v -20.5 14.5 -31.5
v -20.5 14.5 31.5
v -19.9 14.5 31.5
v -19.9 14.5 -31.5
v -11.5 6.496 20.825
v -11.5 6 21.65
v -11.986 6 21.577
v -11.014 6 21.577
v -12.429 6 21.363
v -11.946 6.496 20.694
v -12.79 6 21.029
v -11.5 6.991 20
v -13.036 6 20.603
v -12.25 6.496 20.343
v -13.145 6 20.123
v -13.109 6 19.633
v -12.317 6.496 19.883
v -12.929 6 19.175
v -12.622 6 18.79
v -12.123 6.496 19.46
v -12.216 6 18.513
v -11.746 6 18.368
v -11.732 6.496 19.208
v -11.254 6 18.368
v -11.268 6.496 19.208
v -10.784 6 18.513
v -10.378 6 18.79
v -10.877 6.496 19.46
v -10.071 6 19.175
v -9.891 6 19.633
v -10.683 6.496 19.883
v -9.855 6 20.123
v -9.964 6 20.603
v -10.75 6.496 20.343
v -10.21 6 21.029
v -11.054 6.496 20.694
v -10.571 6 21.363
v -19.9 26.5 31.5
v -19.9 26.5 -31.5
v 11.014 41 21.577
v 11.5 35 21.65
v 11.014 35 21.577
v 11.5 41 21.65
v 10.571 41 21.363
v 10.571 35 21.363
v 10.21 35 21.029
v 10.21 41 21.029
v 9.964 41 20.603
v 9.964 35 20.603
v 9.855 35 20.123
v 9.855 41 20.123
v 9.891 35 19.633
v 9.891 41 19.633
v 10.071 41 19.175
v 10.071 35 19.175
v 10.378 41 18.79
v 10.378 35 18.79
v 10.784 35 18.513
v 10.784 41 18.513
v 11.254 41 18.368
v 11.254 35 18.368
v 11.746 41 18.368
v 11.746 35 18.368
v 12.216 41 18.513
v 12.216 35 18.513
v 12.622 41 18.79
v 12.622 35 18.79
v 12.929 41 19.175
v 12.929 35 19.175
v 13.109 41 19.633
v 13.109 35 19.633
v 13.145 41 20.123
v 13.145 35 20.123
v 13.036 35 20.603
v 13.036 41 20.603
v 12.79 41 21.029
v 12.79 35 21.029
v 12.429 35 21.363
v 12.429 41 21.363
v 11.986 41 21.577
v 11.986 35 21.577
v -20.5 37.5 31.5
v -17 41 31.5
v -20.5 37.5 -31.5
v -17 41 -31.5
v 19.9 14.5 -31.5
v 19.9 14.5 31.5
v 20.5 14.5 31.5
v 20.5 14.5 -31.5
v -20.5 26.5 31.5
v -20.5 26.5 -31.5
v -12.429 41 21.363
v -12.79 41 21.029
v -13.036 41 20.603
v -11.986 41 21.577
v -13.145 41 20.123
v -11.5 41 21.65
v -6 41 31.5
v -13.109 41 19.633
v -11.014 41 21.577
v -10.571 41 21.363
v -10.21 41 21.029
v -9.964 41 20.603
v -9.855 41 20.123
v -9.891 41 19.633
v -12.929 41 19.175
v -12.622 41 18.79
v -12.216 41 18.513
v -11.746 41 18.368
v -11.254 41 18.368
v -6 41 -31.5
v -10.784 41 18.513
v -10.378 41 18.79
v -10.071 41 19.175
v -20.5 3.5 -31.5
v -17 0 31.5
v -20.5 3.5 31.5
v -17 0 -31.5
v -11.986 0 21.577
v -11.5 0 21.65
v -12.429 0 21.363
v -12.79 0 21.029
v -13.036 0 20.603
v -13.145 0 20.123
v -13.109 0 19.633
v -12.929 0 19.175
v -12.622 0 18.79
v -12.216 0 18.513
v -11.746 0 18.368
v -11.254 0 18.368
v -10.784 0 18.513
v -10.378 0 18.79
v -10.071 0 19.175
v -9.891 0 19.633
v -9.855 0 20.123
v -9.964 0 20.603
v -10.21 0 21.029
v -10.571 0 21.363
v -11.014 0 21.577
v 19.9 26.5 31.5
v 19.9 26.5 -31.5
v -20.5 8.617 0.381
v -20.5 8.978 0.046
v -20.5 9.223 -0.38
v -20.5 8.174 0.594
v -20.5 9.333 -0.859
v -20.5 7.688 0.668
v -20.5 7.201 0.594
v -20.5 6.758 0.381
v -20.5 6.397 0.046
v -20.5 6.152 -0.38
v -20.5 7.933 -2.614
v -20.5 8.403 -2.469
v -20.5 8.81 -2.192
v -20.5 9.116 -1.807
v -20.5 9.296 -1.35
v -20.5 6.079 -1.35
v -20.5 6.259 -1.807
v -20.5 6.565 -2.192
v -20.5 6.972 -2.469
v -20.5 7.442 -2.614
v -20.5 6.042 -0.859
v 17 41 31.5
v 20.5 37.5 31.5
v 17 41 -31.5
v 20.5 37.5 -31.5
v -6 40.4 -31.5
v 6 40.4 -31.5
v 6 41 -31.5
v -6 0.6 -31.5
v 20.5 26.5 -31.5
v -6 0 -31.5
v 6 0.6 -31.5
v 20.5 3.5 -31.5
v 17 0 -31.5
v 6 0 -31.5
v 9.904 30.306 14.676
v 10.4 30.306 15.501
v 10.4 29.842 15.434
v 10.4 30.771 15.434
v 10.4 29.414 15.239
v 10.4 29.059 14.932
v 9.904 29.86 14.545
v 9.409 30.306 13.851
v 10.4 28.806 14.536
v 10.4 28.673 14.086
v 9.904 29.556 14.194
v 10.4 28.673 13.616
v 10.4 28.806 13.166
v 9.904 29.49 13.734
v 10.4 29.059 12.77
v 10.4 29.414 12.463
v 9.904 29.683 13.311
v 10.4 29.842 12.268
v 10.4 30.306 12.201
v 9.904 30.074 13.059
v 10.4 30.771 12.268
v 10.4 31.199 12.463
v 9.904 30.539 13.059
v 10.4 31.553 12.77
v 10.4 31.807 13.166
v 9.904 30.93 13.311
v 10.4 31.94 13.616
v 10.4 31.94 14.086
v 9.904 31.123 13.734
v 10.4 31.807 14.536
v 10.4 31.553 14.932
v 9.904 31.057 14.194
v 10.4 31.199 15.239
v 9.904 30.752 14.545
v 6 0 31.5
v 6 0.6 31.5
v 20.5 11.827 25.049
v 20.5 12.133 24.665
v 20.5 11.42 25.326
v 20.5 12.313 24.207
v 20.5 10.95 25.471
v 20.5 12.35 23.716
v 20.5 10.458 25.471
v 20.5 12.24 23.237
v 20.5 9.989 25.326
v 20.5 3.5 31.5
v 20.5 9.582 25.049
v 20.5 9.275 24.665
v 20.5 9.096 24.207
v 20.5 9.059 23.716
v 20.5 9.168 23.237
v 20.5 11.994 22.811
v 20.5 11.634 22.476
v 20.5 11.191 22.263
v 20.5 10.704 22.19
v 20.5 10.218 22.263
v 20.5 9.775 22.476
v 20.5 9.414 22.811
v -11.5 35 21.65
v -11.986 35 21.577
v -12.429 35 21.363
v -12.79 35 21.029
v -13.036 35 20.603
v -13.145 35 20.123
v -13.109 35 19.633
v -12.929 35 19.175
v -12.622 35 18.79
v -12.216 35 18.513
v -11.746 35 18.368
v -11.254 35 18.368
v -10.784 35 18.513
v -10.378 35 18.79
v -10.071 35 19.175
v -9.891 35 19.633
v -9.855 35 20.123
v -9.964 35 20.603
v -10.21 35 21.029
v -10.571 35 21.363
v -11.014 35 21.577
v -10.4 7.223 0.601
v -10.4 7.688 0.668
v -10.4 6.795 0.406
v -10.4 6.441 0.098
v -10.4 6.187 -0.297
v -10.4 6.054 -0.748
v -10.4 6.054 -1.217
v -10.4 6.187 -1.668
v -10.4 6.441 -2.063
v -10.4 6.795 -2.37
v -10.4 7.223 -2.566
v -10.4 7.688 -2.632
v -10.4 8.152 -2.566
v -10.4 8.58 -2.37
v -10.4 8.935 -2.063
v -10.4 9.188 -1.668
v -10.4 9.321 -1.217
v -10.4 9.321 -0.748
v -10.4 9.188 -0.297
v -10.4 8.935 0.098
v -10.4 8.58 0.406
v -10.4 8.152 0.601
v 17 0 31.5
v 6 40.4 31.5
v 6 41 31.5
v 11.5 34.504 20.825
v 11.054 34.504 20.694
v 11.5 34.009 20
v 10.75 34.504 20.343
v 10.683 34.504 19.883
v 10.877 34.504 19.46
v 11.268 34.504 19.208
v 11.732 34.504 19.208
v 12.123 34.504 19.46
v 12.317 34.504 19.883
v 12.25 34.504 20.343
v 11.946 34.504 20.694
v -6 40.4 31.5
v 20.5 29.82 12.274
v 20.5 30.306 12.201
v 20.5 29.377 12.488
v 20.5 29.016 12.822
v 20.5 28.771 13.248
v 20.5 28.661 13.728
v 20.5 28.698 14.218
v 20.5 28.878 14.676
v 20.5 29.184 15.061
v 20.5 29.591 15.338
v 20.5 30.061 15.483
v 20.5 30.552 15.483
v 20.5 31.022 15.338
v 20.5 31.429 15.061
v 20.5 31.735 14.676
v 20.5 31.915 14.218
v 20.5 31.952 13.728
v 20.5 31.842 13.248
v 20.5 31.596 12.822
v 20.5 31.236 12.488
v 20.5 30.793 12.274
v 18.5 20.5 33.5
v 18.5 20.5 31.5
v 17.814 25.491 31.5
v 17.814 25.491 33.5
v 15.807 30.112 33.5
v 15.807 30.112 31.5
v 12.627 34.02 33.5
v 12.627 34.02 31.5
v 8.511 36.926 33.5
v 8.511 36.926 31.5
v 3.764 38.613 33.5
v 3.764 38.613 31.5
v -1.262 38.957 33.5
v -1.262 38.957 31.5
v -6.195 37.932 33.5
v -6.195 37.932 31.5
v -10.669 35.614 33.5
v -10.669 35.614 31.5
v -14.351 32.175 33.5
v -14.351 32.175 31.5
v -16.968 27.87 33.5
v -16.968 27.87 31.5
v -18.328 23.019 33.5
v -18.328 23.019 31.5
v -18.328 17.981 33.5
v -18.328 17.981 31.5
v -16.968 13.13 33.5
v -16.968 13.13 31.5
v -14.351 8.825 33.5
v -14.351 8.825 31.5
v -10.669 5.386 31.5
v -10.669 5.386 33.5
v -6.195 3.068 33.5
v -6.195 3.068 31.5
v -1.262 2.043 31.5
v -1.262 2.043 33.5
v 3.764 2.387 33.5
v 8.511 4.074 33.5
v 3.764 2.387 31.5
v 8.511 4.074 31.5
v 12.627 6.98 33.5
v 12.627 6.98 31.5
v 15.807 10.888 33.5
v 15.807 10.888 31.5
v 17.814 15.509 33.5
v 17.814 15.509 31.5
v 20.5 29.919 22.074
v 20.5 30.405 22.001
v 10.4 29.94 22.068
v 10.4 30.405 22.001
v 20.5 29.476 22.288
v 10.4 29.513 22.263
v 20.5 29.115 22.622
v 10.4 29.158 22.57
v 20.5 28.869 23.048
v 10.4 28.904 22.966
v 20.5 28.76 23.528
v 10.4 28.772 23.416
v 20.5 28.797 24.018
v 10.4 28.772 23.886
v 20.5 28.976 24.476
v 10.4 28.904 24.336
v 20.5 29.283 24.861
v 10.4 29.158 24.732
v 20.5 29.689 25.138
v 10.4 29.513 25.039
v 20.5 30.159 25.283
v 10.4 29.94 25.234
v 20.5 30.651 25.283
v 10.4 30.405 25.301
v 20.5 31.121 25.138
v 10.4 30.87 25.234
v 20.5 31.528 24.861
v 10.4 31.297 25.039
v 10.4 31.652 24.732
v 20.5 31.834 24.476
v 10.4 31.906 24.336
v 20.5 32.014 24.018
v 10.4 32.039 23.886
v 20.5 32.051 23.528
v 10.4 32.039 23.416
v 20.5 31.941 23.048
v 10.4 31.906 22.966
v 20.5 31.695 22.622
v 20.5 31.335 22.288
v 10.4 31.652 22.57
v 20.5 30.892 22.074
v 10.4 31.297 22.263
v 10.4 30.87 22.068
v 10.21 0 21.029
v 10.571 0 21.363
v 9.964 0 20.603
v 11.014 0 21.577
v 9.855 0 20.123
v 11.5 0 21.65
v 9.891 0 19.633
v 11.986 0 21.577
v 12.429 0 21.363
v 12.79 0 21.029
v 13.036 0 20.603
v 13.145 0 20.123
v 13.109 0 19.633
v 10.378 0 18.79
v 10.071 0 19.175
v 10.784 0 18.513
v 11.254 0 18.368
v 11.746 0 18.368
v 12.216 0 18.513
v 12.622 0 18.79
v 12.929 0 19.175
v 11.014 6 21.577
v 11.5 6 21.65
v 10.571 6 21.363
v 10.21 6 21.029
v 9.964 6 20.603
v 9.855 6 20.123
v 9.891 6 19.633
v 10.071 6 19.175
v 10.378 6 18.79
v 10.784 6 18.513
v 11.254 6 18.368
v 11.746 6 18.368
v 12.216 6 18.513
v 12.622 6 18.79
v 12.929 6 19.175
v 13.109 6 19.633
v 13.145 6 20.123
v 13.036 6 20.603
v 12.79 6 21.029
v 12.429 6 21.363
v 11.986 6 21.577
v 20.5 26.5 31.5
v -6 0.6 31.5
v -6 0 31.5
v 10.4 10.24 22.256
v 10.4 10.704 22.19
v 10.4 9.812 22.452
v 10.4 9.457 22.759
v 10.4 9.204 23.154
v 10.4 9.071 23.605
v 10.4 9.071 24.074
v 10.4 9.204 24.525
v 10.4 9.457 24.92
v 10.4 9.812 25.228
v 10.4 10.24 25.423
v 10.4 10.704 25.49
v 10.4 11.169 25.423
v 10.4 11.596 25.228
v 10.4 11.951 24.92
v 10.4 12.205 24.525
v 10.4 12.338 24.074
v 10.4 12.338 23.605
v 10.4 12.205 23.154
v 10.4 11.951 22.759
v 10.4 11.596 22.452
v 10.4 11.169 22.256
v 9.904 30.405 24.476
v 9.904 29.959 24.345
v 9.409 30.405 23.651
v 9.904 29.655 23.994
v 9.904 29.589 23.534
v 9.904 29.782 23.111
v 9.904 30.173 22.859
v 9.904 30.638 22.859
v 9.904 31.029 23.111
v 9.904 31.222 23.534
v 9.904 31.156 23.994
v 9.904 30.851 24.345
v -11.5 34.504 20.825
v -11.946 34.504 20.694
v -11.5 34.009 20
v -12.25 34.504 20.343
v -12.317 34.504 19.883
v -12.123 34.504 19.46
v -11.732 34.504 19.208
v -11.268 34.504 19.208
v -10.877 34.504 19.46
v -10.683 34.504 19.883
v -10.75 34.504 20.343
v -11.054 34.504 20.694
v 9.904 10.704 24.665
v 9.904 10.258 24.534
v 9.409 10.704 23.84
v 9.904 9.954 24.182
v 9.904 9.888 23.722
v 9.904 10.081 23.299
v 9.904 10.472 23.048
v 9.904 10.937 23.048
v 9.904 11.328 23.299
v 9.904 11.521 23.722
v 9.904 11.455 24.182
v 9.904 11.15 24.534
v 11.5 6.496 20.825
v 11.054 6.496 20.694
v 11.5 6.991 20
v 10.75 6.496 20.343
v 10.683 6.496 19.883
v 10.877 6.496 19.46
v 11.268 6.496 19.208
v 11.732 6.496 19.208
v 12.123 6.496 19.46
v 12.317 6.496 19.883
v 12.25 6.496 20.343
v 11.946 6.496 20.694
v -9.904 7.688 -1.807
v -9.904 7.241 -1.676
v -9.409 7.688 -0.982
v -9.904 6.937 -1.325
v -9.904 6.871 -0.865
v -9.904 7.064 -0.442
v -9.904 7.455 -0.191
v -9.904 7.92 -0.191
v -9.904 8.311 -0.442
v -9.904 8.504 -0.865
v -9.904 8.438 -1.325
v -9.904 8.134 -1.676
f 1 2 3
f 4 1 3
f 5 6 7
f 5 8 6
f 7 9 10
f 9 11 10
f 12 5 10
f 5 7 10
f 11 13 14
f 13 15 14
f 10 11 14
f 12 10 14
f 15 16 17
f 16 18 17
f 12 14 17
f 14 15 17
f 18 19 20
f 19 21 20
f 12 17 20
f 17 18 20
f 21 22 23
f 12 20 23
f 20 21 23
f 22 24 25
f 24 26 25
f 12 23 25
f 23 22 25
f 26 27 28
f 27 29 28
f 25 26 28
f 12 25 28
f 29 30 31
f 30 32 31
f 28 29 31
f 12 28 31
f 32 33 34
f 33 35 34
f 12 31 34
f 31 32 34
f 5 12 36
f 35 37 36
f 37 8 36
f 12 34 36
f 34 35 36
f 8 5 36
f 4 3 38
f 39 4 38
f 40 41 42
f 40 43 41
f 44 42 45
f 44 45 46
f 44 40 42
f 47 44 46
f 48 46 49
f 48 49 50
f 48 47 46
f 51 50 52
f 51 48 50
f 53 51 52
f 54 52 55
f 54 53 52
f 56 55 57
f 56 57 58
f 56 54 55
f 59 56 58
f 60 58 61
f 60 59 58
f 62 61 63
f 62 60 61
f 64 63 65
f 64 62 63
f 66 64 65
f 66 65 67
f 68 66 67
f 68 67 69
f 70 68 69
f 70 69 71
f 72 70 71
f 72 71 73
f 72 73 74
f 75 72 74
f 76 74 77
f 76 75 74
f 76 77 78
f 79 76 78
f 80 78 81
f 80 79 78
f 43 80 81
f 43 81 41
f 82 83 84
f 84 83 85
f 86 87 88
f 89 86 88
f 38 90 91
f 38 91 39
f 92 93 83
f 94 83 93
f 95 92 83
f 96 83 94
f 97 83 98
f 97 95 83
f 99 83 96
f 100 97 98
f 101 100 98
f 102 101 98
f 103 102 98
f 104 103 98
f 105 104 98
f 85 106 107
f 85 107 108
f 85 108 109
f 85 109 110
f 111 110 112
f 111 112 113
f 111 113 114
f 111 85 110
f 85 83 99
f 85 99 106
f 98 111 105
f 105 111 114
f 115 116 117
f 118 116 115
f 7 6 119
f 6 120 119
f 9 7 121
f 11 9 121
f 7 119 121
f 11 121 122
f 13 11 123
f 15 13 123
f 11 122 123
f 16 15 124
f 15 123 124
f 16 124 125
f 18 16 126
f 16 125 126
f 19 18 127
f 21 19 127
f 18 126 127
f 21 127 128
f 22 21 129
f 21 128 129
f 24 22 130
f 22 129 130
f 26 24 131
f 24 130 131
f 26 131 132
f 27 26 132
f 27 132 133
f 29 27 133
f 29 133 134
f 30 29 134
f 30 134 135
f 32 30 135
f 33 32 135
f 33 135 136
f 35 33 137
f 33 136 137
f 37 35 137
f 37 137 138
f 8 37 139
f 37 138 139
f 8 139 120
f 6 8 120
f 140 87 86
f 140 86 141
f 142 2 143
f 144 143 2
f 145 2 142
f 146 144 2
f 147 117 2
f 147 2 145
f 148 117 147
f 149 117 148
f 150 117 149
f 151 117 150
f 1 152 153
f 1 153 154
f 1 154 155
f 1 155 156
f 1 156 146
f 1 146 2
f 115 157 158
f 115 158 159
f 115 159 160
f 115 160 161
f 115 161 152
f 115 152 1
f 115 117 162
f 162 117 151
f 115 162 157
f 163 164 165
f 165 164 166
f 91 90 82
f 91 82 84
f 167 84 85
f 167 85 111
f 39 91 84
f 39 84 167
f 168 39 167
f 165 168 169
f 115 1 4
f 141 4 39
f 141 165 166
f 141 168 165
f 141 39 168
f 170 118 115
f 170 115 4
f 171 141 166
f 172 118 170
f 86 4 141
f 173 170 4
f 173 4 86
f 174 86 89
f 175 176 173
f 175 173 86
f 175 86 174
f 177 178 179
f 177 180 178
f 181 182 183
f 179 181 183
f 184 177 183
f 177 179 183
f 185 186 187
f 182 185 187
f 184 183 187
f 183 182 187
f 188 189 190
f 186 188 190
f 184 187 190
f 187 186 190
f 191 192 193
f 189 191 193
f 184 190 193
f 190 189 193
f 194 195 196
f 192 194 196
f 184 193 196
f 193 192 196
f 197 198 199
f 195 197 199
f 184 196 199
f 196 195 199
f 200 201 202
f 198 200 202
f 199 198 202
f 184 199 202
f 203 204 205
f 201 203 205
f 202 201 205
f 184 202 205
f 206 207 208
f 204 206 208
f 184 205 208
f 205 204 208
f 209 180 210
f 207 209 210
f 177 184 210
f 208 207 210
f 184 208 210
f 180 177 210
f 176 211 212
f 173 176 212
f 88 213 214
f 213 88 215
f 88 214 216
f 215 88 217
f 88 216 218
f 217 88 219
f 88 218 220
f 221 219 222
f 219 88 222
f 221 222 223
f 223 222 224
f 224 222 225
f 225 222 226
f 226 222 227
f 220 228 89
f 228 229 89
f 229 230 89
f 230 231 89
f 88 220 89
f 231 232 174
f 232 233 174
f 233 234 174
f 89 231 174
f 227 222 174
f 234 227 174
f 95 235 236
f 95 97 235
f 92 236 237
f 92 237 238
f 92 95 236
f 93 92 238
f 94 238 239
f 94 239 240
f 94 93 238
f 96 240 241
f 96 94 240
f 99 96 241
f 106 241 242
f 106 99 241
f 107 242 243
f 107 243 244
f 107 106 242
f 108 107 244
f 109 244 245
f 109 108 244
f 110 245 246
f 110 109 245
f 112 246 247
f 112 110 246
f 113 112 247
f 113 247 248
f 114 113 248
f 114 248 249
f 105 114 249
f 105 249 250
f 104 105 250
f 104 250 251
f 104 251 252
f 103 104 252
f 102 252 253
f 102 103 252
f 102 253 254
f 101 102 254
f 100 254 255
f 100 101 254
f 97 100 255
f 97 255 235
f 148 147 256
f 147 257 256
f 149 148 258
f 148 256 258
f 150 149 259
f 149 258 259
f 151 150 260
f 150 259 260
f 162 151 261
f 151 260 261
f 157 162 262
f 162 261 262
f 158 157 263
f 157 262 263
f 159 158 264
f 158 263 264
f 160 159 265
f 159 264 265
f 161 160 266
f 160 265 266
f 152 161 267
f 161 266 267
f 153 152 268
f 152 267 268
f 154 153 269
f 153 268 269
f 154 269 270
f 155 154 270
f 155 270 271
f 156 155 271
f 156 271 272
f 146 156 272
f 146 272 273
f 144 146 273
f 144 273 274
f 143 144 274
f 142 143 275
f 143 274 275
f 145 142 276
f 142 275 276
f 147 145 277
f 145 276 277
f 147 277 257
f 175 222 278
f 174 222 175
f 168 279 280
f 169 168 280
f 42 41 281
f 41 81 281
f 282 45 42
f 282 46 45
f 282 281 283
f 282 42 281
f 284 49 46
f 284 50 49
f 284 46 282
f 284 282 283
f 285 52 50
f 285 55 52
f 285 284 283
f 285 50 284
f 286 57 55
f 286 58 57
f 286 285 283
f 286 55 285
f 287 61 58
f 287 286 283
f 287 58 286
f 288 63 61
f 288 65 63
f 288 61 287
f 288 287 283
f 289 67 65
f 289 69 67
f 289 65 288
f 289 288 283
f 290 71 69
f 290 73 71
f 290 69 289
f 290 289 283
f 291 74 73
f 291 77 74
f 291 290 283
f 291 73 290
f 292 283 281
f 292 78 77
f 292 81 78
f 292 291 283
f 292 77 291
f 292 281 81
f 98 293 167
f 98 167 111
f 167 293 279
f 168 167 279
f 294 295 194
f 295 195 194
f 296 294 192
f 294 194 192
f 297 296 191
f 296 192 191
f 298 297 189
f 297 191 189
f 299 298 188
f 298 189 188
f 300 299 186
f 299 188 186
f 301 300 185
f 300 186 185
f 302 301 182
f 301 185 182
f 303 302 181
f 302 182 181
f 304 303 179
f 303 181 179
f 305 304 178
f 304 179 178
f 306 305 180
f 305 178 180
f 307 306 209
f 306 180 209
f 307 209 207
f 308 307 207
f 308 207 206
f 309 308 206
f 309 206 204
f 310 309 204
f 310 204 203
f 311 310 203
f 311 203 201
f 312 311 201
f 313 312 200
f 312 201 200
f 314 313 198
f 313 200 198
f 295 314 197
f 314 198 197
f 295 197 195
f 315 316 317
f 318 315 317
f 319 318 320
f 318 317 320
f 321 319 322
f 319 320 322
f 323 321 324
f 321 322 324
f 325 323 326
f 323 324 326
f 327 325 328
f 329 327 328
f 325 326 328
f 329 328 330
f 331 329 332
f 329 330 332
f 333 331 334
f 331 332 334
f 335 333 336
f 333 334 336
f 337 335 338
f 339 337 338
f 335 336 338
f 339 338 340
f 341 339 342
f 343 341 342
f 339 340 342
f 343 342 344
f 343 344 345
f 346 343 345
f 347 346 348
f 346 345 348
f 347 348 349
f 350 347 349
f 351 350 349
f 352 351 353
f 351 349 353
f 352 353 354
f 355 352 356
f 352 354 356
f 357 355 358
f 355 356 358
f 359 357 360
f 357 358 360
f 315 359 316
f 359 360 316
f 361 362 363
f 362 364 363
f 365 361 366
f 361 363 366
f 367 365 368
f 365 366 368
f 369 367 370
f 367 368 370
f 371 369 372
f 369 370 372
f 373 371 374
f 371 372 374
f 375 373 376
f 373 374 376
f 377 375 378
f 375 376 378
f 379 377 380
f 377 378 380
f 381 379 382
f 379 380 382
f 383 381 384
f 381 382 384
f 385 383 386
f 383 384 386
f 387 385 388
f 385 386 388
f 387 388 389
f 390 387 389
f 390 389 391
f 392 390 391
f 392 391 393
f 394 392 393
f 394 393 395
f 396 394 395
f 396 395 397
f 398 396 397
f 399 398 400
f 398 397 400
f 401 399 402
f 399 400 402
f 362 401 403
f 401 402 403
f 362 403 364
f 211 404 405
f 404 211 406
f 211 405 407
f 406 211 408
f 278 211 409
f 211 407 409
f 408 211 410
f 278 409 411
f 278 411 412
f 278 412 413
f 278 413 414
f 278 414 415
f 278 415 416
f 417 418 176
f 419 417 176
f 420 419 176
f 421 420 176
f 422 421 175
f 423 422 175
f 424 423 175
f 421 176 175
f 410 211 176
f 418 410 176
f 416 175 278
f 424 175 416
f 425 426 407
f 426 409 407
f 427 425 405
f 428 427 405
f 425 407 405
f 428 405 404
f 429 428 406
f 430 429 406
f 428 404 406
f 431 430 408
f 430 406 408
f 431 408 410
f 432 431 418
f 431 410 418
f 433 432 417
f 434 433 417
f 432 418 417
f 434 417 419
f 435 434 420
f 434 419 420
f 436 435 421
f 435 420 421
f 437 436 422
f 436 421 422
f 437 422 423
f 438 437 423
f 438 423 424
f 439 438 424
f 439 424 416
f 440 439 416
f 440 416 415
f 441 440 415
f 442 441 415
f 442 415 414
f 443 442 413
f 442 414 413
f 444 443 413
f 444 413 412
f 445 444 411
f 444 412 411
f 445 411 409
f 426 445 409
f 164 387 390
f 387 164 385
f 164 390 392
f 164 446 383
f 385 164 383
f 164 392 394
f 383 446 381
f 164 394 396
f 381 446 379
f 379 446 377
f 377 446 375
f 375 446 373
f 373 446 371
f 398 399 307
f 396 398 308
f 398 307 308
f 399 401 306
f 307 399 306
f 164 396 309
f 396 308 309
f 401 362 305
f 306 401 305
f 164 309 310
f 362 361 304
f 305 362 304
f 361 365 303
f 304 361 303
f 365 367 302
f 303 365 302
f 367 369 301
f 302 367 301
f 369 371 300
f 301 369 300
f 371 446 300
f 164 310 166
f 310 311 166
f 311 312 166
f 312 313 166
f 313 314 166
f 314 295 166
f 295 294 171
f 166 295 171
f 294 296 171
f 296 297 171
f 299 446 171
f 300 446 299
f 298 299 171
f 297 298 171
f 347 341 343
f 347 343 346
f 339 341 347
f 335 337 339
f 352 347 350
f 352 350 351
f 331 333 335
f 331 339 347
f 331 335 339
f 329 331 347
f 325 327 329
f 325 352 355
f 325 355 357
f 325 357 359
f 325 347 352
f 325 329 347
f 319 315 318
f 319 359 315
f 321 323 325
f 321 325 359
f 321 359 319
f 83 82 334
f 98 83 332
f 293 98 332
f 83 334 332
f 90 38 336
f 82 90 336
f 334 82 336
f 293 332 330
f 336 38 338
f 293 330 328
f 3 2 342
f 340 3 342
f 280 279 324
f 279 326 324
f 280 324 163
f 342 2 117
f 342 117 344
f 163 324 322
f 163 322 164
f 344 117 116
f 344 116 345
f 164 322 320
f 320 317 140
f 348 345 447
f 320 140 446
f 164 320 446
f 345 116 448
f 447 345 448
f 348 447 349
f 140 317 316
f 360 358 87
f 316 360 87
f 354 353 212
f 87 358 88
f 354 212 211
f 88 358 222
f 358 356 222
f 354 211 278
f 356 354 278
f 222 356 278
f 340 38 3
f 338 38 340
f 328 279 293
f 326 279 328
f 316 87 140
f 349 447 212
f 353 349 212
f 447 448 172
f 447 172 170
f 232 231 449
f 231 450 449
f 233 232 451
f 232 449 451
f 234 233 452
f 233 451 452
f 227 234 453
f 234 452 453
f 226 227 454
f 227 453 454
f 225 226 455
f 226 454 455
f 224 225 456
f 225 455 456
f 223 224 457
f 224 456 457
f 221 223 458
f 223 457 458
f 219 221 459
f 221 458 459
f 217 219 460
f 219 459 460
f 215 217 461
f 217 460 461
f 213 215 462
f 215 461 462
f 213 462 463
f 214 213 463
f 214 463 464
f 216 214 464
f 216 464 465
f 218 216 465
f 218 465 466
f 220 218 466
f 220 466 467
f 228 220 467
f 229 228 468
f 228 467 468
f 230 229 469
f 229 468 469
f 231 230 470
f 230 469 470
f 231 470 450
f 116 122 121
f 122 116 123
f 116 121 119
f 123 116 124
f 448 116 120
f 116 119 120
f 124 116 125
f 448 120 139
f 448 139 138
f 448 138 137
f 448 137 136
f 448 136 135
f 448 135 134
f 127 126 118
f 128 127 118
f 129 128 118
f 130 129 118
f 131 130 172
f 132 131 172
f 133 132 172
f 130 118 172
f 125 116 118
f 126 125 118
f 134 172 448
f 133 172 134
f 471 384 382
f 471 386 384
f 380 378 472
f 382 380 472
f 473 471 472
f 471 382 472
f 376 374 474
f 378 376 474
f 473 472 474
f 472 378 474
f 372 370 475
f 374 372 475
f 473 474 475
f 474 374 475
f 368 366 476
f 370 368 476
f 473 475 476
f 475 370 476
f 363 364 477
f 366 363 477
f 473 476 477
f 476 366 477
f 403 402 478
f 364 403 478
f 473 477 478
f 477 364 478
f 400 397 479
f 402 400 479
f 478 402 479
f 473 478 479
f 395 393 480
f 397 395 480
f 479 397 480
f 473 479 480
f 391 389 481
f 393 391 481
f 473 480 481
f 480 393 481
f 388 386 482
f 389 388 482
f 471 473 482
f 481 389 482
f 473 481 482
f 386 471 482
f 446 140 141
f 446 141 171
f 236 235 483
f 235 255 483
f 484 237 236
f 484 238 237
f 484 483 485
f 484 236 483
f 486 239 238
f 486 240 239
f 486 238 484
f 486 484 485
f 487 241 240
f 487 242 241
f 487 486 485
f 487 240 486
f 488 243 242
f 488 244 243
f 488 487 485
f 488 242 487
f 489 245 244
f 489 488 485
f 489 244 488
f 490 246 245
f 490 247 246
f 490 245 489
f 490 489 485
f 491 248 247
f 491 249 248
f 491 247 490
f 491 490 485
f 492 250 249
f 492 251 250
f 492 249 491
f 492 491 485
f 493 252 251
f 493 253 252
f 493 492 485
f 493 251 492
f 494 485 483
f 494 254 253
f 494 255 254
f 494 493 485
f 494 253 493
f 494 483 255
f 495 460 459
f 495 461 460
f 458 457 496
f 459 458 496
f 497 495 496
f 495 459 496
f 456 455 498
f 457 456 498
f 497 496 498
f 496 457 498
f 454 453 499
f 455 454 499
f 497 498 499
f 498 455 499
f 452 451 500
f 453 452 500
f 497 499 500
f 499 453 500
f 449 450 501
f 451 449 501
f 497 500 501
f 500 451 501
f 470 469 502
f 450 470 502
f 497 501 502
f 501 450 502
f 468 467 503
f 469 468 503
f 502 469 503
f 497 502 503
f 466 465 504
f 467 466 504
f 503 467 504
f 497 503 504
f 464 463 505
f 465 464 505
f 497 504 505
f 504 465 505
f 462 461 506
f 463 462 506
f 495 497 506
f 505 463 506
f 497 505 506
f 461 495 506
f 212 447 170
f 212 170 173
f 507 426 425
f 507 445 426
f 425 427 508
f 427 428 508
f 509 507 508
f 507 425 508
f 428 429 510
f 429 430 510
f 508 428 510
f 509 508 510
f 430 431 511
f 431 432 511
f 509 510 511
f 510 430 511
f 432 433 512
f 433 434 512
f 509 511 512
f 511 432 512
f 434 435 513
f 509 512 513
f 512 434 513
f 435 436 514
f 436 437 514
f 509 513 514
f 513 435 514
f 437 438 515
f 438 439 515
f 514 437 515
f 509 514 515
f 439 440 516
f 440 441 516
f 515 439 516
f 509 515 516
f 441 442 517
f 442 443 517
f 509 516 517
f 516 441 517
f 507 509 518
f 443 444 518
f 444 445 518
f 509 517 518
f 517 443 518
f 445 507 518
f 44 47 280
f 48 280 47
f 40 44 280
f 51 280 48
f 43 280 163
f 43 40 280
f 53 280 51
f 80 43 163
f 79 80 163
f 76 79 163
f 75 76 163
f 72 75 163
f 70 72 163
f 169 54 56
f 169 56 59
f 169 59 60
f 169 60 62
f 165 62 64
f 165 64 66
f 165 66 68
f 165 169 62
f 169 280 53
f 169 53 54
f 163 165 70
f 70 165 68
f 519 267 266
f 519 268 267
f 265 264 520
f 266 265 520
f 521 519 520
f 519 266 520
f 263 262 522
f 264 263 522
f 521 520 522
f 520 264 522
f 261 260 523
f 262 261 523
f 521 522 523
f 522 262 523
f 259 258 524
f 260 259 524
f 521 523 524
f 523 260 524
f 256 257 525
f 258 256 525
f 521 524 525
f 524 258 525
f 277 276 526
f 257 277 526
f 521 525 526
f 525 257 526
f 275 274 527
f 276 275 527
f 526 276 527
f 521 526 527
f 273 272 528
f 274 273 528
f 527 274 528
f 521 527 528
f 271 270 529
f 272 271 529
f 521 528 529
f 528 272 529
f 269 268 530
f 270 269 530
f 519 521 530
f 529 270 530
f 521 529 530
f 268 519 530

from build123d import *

# Parameters (mm, degrees)
SKETCH_1_W                       = 41
SKETCH_1_H                       = 63
EXTRUDE_1_DEPTH                  = 41
HOLE_WIZARD_M4_1_AT_2_COUNT      = 2
HOLE_WIZARD_M4_1_AT_2_PITCH      = 23
CHAMFER_1_SIZE                   = 3.5
CUT_EXTRUDE_1_REACH              = 79.912
SKETCH_4_W                       = 12
SKETCH_4_H                       = 0.6
SKETCH_4_W_2                     = 0.6
SKETCH_4_H_2                     = 12
SKETCH_5_R                       = 18.5
EXTRUDE_2_DEPTH                  = 2
HOLE_WIZARD_M4_3_D               = 3.3
HOLE_WIZARD_M4_3_DEPTH           = 10.1
HOLE_WIZARD_M4_3_TIP             = 0.991420021
HOLE_WIZARD_M4_3_ON_FACE_2_D     = 3.3
HOLE_WIZARD_M4_3_ON_FACE_2_DEPTH = 10.1
HOLE_WIZARD_M4_3_ON_FACE_2_TIP   = 0.991420021


with BuildPart() as part:
    # 草图1 → 凸台-拉伸1 (new body)
    with BuildSketch(Plane(origin=(0, 0, 0), x_dir=(1, 0, 0), z_dir=(0, 1, 0))):
        Rectangle(SKETCH_1_W, SKETCH_1_H)
    extrude(amount=EXTRUDE_1_DEPTH)

    # 草图3 → M4 螺纹孔1 (revolve, cut)
    with BuildSketch(Plane(origin=(-11.5, 41, 20), x_dir=(0, 0, 1), z_dir=(1, 0, 0))):
        Polygon((0, 0), (0, 6.991420021), (1.65, 6), (1.65, 0), align=None)
    hole_wizard_m4_1 = revolve(axis=Axis((-11.5, 47.35, 20), (0, -1, 0)), mode=Mode.SUBTRACT)

    # M4 螺纹孔1 at 2: M4 螺纹孔1 ×2
    with Locations(*[(i * HOLE_WIZARD_M4_1_AT_2_PITCH, 0, 0) for i in range(1, HOLE_WIZARD_M4_1_AT_2_COUNT)]):
        add(hole_wizard_m4_1, mode=Mode.SUBTRACT)

    # 镜向1: M4 螺纹孔1 across plane
    add(hole_wizard_m4_1.mirror(Plane.ZX.offset(20.5)), mode=Mode.SUBTRACT)

    # 镜向1 copy 1 sketch → 镜向1 copy 1 (revolve, cut)
    with BuildSketch(Plane(origin=(11.5, 0, 20), x_dir=(0, 0, 1), z_dir=(1, 0, 0))):
        Polygon((0, 0), (0, -6.991420021), (1.65, -6), (1.65, 0), align=None)
    revolve(axis=Axis((11.5, -6.35, 20), (0, -1, 0)), mode=Mode.SUBTRACT)

    # 倒角1
    chamfer_1_edges = [part.edges().sort_by_distance(p)[0] for p in [
        (-20.5, 41, 0),
        (20.5, 41, 0),
        (-20.5, 0, 0),
        (20.5, 0, 0),
    ]]
    chamfer(chamfer_1_edges, length=CHAMFER_1_SIZE)

    # 草图4 → 切除-拉伸1 (cut, up to next)
    with BuildSketch(Plane.XY.offset(31.5), mode=Mode.PRIVATE) as cut_extrude_1_sk1:
        with Locations((0, 40.7)):
            Rectangle(SKETCH_4_W, SKETCH_4_H)
    cut_extrude_1_tool1 = extrude(cut_extrude_1_sk1.sketch, amount=-CUT_EXTRUDE_1_REACH, mode=Mode.PRIVATE) & part.part
    # 草图4 → 切除-拉伸1 (cut, up to next)
    with BuildSketch(Plane.XY.offset(31.5), mode=Mode.PRIVATE) as cut_extrude_1_sk2:
        with Locations((20.2, 20.5)):
            Rectangle(SKETCH_4_W_2, SKETCH_4_H_2)
    cut_extrude_1_tool2 = extrude(cut_extrude_1_sk2.sketch, amount=-CUT_EXTRUDE_1_REACH, mode=Mode.PRIVATE) & part.part
    # 草图4 → 切除-拉伸1 (cut, up to next)
    with BuildSketch(Plane.XY.offset(31.5), mode=Mode.PRIVATE) as cut_extrude_1_sk3:
        with Locations((0, 0.3)):
            Rectangle(SKETCH_4_W, SKETCH_4_H)
    cut_extrude_1_tool3 = extrude(cut_extrude_1_sk3.sketch, amount=-CUT_EXTRUDE_1_REACH, mode=Mode.PRIVATE) & part.part
    # 草图4 → 切除-拉伸1 (cut, up to next)
    with BuildSketch(Plane.XY.offset(31.5), mode=Mode.PRIVATE) as cut_extrude_1_sk4:
        with Locations((-20.2, 20.5)):
            Rectangle(SKETCH_4_W_2, SKETCH_4_H_2)
    cut_extrude_1_tool4 = extrude(cut_extrude_1_sk4.sketch, amount=-CUT_EXTRUDE_1_REACH, mode=Mode.PRIVATE) & part.part
    add(cut_extrude_1_tool1.solids().sort_by_distance((0, 40.7, 31.5))[0], mode=Mode.SUBTRACT)
    add(cut_extrude_1_tool2.solids().sort_by_distance((20.2, 20.5, 31.5))[0], mode=Mode.SUBTRACT)
    add(cut_extrude_1_tool3.solids().sort_by_distance((0, 0.3, 31.5))[0], mode=Mode.SUBTRACT)
    add(cut_extrude_1_tool4.solids().sort_by_distance((-20.2, 20.5, 31.5))[0], mode=Mode.SUBTRACT)

    # 草图5 → 凸台-拉伸2 (add)
    with BuildSketch(Plane.XY.offset(31.5)):
        with Locations((0, 20.5)):
            Circle(SKETCH_5_R)
    extrude(amount=EXTRUDE_2_DEPTH)

    # M4 螺纹孔3
    with Locations(Plane(origin=(20.5, 30.405354364, 23.651006077), x_dir=(0, 0, 1), z_dir=(1, 0, 0))):
        with Locations((0, 0), (-9.799993904, 0.098891397), (0.188566307, 19.700944215)):
            Hole(HOLE_WIZARD_M4_3_D / 2, depth=HOLE_WIZARD_M4_3_DEPTH)
            with Locations((0, 0, -(HOLE_WIZARD_M4_3_DEPTH + HOLE_WIZARD_M4_3_TIP / 2))):  # 118° drill point
                Cone(0, HOLE_WIZARD_M4_3_D / 2, HOLE_WIZARD_M4_3_TIP, mode=Mode.SUBTRACT)

    # M4 螺纹孔3 on face 2
    with Locations(Plane(origin=(-20.5, 7.687513873, -0.982360161), x_dir=(0, 0, -1), z_dir=(-1, 0, 0))):
        with Locations((0, 0)):
            Hole(HOLE_WIZARD_M4_3_ON_FACE_2_D / 2, depth=HOLE_WIZARD_M4_3_ON_FACE_2_DEPTH)
            with Locations((0, 0, -(HOLE_WIZARD_M4_3_ON_FACE_2_DEPTH + HOLE_WIZARD_M4_3_ON_FACE_2_TIP / 2))):  # 118° drill point
                Cone(0, HOLE_WIZARD_M4_3_ON_FACE_2_D / 2, HOLE_WIZARD_M4_3_ON_FACE_2_TIP, mode=Mode.SUBTRACT)


solid = part.part
